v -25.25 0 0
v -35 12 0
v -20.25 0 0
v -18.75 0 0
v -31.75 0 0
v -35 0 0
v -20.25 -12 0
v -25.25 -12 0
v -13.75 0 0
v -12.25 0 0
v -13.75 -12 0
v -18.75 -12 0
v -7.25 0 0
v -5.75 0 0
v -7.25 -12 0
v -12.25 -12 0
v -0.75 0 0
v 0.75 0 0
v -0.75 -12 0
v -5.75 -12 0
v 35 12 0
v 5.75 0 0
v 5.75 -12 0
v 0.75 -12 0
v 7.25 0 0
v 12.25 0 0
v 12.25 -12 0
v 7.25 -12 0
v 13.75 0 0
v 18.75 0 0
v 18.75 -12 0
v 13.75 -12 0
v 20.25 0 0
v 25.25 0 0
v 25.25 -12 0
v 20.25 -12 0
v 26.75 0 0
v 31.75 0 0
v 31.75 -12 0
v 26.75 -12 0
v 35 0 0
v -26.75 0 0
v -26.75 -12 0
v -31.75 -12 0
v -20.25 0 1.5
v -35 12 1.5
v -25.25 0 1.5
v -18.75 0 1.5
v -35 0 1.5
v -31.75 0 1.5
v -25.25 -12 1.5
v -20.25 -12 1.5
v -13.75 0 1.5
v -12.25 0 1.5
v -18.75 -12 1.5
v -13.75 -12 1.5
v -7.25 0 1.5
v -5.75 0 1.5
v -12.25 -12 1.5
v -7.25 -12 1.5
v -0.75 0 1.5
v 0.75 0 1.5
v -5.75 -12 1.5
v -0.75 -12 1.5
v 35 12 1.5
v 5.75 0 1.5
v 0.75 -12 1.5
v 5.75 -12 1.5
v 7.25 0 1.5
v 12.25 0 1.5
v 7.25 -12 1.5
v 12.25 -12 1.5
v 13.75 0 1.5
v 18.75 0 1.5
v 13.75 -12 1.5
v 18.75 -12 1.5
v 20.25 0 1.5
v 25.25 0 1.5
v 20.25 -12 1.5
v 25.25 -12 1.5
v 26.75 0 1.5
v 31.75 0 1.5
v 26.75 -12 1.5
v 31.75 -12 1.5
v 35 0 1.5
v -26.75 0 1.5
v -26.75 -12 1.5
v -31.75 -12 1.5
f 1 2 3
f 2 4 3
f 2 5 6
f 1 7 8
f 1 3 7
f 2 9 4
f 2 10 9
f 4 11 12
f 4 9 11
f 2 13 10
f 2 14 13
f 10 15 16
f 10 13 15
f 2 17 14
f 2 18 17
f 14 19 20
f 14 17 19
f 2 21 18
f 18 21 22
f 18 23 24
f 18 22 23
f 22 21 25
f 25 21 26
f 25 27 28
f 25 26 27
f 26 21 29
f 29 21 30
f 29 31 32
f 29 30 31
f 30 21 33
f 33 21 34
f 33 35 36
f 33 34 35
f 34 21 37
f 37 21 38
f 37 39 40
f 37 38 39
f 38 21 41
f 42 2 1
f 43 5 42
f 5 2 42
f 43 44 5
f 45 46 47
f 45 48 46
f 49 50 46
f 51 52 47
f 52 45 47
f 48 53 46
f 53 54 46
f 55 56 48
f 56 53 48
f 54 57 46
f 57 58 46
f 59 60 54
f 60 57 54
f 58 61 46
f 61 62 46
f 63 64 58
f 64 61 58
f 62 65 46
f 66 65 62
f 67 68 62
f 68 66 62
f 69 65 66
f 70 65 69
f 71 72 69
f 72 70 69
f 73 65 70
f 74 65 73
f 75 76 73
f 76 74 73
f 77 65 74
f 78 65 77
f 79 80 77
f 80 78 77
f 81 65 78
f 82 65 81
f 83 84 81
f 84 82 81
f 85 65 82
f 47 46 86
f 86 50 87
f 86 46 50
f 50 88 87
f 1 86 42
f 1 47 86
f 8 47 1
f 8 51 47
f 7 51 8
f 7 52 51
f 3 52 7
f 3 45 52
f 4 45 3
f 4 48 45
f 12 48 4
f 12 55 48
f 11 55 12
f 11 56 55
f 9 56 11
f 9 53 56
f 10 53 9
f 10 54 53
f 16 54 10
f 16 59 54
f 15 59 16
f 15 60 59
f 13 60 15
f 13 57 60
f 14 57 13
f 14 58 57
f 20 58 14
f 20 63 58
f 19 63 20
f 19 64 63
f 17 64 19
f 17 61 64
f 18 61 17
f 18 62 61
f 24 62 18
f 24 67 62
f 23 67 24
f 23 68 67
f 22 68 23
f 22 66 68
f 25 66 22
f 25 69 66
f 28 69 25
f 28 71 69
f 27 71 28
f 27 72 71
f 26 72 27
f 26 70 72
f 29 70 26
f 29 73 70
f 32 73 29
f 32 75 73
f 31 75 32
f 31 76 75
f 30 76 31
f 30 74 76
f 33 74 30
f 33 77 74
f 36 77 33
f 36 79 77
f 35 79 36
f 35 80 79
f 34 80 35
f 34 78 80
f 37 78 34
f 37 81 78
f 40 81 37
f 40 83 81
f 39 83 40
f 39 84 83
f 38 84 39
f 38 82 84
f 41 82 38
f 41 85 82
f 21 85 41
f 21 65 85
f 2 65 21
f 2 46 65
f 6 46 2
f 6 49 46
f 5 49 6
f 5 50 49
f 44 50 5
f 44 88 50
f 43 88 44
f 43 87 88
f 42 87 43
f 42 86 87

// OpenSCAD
// 10-well comb for casting agarose gels
// Category: tools. Flat part, prints lying down; the bottom (bed) side is smoothest.
// Print: PETG (survives hot agarose better than PLA), 0.15 mm layers, 100 % infill.
// SPDX-License-Identifier: CERN-OHL-P-2.0

/* [Comb] */
spine = [70, 12];      // back bar, X x Y [mm]
n_teeth = 10;
tooth_w = 5.0;         // well width
tooth_len = 12;        // well depth into the gel
gap = 1.5;             // gel between wells
thickness = 1.5;       // well thickness (comb printed flat)

/* [Hidden] */
eps = 0.01;
span = n_teeth * tooth_w + (n_teeth - 1) * gap;

linear_extrude(thickness) {
    translate([-spine.x / 2, 0]) square(spine);
    for (i = [0 : n_teeth - 1])
        translate([-span / 2 + i * (tooth_w + gap), -tooth_len])
            square([tooth_w, tooth_len + eps]);
}
